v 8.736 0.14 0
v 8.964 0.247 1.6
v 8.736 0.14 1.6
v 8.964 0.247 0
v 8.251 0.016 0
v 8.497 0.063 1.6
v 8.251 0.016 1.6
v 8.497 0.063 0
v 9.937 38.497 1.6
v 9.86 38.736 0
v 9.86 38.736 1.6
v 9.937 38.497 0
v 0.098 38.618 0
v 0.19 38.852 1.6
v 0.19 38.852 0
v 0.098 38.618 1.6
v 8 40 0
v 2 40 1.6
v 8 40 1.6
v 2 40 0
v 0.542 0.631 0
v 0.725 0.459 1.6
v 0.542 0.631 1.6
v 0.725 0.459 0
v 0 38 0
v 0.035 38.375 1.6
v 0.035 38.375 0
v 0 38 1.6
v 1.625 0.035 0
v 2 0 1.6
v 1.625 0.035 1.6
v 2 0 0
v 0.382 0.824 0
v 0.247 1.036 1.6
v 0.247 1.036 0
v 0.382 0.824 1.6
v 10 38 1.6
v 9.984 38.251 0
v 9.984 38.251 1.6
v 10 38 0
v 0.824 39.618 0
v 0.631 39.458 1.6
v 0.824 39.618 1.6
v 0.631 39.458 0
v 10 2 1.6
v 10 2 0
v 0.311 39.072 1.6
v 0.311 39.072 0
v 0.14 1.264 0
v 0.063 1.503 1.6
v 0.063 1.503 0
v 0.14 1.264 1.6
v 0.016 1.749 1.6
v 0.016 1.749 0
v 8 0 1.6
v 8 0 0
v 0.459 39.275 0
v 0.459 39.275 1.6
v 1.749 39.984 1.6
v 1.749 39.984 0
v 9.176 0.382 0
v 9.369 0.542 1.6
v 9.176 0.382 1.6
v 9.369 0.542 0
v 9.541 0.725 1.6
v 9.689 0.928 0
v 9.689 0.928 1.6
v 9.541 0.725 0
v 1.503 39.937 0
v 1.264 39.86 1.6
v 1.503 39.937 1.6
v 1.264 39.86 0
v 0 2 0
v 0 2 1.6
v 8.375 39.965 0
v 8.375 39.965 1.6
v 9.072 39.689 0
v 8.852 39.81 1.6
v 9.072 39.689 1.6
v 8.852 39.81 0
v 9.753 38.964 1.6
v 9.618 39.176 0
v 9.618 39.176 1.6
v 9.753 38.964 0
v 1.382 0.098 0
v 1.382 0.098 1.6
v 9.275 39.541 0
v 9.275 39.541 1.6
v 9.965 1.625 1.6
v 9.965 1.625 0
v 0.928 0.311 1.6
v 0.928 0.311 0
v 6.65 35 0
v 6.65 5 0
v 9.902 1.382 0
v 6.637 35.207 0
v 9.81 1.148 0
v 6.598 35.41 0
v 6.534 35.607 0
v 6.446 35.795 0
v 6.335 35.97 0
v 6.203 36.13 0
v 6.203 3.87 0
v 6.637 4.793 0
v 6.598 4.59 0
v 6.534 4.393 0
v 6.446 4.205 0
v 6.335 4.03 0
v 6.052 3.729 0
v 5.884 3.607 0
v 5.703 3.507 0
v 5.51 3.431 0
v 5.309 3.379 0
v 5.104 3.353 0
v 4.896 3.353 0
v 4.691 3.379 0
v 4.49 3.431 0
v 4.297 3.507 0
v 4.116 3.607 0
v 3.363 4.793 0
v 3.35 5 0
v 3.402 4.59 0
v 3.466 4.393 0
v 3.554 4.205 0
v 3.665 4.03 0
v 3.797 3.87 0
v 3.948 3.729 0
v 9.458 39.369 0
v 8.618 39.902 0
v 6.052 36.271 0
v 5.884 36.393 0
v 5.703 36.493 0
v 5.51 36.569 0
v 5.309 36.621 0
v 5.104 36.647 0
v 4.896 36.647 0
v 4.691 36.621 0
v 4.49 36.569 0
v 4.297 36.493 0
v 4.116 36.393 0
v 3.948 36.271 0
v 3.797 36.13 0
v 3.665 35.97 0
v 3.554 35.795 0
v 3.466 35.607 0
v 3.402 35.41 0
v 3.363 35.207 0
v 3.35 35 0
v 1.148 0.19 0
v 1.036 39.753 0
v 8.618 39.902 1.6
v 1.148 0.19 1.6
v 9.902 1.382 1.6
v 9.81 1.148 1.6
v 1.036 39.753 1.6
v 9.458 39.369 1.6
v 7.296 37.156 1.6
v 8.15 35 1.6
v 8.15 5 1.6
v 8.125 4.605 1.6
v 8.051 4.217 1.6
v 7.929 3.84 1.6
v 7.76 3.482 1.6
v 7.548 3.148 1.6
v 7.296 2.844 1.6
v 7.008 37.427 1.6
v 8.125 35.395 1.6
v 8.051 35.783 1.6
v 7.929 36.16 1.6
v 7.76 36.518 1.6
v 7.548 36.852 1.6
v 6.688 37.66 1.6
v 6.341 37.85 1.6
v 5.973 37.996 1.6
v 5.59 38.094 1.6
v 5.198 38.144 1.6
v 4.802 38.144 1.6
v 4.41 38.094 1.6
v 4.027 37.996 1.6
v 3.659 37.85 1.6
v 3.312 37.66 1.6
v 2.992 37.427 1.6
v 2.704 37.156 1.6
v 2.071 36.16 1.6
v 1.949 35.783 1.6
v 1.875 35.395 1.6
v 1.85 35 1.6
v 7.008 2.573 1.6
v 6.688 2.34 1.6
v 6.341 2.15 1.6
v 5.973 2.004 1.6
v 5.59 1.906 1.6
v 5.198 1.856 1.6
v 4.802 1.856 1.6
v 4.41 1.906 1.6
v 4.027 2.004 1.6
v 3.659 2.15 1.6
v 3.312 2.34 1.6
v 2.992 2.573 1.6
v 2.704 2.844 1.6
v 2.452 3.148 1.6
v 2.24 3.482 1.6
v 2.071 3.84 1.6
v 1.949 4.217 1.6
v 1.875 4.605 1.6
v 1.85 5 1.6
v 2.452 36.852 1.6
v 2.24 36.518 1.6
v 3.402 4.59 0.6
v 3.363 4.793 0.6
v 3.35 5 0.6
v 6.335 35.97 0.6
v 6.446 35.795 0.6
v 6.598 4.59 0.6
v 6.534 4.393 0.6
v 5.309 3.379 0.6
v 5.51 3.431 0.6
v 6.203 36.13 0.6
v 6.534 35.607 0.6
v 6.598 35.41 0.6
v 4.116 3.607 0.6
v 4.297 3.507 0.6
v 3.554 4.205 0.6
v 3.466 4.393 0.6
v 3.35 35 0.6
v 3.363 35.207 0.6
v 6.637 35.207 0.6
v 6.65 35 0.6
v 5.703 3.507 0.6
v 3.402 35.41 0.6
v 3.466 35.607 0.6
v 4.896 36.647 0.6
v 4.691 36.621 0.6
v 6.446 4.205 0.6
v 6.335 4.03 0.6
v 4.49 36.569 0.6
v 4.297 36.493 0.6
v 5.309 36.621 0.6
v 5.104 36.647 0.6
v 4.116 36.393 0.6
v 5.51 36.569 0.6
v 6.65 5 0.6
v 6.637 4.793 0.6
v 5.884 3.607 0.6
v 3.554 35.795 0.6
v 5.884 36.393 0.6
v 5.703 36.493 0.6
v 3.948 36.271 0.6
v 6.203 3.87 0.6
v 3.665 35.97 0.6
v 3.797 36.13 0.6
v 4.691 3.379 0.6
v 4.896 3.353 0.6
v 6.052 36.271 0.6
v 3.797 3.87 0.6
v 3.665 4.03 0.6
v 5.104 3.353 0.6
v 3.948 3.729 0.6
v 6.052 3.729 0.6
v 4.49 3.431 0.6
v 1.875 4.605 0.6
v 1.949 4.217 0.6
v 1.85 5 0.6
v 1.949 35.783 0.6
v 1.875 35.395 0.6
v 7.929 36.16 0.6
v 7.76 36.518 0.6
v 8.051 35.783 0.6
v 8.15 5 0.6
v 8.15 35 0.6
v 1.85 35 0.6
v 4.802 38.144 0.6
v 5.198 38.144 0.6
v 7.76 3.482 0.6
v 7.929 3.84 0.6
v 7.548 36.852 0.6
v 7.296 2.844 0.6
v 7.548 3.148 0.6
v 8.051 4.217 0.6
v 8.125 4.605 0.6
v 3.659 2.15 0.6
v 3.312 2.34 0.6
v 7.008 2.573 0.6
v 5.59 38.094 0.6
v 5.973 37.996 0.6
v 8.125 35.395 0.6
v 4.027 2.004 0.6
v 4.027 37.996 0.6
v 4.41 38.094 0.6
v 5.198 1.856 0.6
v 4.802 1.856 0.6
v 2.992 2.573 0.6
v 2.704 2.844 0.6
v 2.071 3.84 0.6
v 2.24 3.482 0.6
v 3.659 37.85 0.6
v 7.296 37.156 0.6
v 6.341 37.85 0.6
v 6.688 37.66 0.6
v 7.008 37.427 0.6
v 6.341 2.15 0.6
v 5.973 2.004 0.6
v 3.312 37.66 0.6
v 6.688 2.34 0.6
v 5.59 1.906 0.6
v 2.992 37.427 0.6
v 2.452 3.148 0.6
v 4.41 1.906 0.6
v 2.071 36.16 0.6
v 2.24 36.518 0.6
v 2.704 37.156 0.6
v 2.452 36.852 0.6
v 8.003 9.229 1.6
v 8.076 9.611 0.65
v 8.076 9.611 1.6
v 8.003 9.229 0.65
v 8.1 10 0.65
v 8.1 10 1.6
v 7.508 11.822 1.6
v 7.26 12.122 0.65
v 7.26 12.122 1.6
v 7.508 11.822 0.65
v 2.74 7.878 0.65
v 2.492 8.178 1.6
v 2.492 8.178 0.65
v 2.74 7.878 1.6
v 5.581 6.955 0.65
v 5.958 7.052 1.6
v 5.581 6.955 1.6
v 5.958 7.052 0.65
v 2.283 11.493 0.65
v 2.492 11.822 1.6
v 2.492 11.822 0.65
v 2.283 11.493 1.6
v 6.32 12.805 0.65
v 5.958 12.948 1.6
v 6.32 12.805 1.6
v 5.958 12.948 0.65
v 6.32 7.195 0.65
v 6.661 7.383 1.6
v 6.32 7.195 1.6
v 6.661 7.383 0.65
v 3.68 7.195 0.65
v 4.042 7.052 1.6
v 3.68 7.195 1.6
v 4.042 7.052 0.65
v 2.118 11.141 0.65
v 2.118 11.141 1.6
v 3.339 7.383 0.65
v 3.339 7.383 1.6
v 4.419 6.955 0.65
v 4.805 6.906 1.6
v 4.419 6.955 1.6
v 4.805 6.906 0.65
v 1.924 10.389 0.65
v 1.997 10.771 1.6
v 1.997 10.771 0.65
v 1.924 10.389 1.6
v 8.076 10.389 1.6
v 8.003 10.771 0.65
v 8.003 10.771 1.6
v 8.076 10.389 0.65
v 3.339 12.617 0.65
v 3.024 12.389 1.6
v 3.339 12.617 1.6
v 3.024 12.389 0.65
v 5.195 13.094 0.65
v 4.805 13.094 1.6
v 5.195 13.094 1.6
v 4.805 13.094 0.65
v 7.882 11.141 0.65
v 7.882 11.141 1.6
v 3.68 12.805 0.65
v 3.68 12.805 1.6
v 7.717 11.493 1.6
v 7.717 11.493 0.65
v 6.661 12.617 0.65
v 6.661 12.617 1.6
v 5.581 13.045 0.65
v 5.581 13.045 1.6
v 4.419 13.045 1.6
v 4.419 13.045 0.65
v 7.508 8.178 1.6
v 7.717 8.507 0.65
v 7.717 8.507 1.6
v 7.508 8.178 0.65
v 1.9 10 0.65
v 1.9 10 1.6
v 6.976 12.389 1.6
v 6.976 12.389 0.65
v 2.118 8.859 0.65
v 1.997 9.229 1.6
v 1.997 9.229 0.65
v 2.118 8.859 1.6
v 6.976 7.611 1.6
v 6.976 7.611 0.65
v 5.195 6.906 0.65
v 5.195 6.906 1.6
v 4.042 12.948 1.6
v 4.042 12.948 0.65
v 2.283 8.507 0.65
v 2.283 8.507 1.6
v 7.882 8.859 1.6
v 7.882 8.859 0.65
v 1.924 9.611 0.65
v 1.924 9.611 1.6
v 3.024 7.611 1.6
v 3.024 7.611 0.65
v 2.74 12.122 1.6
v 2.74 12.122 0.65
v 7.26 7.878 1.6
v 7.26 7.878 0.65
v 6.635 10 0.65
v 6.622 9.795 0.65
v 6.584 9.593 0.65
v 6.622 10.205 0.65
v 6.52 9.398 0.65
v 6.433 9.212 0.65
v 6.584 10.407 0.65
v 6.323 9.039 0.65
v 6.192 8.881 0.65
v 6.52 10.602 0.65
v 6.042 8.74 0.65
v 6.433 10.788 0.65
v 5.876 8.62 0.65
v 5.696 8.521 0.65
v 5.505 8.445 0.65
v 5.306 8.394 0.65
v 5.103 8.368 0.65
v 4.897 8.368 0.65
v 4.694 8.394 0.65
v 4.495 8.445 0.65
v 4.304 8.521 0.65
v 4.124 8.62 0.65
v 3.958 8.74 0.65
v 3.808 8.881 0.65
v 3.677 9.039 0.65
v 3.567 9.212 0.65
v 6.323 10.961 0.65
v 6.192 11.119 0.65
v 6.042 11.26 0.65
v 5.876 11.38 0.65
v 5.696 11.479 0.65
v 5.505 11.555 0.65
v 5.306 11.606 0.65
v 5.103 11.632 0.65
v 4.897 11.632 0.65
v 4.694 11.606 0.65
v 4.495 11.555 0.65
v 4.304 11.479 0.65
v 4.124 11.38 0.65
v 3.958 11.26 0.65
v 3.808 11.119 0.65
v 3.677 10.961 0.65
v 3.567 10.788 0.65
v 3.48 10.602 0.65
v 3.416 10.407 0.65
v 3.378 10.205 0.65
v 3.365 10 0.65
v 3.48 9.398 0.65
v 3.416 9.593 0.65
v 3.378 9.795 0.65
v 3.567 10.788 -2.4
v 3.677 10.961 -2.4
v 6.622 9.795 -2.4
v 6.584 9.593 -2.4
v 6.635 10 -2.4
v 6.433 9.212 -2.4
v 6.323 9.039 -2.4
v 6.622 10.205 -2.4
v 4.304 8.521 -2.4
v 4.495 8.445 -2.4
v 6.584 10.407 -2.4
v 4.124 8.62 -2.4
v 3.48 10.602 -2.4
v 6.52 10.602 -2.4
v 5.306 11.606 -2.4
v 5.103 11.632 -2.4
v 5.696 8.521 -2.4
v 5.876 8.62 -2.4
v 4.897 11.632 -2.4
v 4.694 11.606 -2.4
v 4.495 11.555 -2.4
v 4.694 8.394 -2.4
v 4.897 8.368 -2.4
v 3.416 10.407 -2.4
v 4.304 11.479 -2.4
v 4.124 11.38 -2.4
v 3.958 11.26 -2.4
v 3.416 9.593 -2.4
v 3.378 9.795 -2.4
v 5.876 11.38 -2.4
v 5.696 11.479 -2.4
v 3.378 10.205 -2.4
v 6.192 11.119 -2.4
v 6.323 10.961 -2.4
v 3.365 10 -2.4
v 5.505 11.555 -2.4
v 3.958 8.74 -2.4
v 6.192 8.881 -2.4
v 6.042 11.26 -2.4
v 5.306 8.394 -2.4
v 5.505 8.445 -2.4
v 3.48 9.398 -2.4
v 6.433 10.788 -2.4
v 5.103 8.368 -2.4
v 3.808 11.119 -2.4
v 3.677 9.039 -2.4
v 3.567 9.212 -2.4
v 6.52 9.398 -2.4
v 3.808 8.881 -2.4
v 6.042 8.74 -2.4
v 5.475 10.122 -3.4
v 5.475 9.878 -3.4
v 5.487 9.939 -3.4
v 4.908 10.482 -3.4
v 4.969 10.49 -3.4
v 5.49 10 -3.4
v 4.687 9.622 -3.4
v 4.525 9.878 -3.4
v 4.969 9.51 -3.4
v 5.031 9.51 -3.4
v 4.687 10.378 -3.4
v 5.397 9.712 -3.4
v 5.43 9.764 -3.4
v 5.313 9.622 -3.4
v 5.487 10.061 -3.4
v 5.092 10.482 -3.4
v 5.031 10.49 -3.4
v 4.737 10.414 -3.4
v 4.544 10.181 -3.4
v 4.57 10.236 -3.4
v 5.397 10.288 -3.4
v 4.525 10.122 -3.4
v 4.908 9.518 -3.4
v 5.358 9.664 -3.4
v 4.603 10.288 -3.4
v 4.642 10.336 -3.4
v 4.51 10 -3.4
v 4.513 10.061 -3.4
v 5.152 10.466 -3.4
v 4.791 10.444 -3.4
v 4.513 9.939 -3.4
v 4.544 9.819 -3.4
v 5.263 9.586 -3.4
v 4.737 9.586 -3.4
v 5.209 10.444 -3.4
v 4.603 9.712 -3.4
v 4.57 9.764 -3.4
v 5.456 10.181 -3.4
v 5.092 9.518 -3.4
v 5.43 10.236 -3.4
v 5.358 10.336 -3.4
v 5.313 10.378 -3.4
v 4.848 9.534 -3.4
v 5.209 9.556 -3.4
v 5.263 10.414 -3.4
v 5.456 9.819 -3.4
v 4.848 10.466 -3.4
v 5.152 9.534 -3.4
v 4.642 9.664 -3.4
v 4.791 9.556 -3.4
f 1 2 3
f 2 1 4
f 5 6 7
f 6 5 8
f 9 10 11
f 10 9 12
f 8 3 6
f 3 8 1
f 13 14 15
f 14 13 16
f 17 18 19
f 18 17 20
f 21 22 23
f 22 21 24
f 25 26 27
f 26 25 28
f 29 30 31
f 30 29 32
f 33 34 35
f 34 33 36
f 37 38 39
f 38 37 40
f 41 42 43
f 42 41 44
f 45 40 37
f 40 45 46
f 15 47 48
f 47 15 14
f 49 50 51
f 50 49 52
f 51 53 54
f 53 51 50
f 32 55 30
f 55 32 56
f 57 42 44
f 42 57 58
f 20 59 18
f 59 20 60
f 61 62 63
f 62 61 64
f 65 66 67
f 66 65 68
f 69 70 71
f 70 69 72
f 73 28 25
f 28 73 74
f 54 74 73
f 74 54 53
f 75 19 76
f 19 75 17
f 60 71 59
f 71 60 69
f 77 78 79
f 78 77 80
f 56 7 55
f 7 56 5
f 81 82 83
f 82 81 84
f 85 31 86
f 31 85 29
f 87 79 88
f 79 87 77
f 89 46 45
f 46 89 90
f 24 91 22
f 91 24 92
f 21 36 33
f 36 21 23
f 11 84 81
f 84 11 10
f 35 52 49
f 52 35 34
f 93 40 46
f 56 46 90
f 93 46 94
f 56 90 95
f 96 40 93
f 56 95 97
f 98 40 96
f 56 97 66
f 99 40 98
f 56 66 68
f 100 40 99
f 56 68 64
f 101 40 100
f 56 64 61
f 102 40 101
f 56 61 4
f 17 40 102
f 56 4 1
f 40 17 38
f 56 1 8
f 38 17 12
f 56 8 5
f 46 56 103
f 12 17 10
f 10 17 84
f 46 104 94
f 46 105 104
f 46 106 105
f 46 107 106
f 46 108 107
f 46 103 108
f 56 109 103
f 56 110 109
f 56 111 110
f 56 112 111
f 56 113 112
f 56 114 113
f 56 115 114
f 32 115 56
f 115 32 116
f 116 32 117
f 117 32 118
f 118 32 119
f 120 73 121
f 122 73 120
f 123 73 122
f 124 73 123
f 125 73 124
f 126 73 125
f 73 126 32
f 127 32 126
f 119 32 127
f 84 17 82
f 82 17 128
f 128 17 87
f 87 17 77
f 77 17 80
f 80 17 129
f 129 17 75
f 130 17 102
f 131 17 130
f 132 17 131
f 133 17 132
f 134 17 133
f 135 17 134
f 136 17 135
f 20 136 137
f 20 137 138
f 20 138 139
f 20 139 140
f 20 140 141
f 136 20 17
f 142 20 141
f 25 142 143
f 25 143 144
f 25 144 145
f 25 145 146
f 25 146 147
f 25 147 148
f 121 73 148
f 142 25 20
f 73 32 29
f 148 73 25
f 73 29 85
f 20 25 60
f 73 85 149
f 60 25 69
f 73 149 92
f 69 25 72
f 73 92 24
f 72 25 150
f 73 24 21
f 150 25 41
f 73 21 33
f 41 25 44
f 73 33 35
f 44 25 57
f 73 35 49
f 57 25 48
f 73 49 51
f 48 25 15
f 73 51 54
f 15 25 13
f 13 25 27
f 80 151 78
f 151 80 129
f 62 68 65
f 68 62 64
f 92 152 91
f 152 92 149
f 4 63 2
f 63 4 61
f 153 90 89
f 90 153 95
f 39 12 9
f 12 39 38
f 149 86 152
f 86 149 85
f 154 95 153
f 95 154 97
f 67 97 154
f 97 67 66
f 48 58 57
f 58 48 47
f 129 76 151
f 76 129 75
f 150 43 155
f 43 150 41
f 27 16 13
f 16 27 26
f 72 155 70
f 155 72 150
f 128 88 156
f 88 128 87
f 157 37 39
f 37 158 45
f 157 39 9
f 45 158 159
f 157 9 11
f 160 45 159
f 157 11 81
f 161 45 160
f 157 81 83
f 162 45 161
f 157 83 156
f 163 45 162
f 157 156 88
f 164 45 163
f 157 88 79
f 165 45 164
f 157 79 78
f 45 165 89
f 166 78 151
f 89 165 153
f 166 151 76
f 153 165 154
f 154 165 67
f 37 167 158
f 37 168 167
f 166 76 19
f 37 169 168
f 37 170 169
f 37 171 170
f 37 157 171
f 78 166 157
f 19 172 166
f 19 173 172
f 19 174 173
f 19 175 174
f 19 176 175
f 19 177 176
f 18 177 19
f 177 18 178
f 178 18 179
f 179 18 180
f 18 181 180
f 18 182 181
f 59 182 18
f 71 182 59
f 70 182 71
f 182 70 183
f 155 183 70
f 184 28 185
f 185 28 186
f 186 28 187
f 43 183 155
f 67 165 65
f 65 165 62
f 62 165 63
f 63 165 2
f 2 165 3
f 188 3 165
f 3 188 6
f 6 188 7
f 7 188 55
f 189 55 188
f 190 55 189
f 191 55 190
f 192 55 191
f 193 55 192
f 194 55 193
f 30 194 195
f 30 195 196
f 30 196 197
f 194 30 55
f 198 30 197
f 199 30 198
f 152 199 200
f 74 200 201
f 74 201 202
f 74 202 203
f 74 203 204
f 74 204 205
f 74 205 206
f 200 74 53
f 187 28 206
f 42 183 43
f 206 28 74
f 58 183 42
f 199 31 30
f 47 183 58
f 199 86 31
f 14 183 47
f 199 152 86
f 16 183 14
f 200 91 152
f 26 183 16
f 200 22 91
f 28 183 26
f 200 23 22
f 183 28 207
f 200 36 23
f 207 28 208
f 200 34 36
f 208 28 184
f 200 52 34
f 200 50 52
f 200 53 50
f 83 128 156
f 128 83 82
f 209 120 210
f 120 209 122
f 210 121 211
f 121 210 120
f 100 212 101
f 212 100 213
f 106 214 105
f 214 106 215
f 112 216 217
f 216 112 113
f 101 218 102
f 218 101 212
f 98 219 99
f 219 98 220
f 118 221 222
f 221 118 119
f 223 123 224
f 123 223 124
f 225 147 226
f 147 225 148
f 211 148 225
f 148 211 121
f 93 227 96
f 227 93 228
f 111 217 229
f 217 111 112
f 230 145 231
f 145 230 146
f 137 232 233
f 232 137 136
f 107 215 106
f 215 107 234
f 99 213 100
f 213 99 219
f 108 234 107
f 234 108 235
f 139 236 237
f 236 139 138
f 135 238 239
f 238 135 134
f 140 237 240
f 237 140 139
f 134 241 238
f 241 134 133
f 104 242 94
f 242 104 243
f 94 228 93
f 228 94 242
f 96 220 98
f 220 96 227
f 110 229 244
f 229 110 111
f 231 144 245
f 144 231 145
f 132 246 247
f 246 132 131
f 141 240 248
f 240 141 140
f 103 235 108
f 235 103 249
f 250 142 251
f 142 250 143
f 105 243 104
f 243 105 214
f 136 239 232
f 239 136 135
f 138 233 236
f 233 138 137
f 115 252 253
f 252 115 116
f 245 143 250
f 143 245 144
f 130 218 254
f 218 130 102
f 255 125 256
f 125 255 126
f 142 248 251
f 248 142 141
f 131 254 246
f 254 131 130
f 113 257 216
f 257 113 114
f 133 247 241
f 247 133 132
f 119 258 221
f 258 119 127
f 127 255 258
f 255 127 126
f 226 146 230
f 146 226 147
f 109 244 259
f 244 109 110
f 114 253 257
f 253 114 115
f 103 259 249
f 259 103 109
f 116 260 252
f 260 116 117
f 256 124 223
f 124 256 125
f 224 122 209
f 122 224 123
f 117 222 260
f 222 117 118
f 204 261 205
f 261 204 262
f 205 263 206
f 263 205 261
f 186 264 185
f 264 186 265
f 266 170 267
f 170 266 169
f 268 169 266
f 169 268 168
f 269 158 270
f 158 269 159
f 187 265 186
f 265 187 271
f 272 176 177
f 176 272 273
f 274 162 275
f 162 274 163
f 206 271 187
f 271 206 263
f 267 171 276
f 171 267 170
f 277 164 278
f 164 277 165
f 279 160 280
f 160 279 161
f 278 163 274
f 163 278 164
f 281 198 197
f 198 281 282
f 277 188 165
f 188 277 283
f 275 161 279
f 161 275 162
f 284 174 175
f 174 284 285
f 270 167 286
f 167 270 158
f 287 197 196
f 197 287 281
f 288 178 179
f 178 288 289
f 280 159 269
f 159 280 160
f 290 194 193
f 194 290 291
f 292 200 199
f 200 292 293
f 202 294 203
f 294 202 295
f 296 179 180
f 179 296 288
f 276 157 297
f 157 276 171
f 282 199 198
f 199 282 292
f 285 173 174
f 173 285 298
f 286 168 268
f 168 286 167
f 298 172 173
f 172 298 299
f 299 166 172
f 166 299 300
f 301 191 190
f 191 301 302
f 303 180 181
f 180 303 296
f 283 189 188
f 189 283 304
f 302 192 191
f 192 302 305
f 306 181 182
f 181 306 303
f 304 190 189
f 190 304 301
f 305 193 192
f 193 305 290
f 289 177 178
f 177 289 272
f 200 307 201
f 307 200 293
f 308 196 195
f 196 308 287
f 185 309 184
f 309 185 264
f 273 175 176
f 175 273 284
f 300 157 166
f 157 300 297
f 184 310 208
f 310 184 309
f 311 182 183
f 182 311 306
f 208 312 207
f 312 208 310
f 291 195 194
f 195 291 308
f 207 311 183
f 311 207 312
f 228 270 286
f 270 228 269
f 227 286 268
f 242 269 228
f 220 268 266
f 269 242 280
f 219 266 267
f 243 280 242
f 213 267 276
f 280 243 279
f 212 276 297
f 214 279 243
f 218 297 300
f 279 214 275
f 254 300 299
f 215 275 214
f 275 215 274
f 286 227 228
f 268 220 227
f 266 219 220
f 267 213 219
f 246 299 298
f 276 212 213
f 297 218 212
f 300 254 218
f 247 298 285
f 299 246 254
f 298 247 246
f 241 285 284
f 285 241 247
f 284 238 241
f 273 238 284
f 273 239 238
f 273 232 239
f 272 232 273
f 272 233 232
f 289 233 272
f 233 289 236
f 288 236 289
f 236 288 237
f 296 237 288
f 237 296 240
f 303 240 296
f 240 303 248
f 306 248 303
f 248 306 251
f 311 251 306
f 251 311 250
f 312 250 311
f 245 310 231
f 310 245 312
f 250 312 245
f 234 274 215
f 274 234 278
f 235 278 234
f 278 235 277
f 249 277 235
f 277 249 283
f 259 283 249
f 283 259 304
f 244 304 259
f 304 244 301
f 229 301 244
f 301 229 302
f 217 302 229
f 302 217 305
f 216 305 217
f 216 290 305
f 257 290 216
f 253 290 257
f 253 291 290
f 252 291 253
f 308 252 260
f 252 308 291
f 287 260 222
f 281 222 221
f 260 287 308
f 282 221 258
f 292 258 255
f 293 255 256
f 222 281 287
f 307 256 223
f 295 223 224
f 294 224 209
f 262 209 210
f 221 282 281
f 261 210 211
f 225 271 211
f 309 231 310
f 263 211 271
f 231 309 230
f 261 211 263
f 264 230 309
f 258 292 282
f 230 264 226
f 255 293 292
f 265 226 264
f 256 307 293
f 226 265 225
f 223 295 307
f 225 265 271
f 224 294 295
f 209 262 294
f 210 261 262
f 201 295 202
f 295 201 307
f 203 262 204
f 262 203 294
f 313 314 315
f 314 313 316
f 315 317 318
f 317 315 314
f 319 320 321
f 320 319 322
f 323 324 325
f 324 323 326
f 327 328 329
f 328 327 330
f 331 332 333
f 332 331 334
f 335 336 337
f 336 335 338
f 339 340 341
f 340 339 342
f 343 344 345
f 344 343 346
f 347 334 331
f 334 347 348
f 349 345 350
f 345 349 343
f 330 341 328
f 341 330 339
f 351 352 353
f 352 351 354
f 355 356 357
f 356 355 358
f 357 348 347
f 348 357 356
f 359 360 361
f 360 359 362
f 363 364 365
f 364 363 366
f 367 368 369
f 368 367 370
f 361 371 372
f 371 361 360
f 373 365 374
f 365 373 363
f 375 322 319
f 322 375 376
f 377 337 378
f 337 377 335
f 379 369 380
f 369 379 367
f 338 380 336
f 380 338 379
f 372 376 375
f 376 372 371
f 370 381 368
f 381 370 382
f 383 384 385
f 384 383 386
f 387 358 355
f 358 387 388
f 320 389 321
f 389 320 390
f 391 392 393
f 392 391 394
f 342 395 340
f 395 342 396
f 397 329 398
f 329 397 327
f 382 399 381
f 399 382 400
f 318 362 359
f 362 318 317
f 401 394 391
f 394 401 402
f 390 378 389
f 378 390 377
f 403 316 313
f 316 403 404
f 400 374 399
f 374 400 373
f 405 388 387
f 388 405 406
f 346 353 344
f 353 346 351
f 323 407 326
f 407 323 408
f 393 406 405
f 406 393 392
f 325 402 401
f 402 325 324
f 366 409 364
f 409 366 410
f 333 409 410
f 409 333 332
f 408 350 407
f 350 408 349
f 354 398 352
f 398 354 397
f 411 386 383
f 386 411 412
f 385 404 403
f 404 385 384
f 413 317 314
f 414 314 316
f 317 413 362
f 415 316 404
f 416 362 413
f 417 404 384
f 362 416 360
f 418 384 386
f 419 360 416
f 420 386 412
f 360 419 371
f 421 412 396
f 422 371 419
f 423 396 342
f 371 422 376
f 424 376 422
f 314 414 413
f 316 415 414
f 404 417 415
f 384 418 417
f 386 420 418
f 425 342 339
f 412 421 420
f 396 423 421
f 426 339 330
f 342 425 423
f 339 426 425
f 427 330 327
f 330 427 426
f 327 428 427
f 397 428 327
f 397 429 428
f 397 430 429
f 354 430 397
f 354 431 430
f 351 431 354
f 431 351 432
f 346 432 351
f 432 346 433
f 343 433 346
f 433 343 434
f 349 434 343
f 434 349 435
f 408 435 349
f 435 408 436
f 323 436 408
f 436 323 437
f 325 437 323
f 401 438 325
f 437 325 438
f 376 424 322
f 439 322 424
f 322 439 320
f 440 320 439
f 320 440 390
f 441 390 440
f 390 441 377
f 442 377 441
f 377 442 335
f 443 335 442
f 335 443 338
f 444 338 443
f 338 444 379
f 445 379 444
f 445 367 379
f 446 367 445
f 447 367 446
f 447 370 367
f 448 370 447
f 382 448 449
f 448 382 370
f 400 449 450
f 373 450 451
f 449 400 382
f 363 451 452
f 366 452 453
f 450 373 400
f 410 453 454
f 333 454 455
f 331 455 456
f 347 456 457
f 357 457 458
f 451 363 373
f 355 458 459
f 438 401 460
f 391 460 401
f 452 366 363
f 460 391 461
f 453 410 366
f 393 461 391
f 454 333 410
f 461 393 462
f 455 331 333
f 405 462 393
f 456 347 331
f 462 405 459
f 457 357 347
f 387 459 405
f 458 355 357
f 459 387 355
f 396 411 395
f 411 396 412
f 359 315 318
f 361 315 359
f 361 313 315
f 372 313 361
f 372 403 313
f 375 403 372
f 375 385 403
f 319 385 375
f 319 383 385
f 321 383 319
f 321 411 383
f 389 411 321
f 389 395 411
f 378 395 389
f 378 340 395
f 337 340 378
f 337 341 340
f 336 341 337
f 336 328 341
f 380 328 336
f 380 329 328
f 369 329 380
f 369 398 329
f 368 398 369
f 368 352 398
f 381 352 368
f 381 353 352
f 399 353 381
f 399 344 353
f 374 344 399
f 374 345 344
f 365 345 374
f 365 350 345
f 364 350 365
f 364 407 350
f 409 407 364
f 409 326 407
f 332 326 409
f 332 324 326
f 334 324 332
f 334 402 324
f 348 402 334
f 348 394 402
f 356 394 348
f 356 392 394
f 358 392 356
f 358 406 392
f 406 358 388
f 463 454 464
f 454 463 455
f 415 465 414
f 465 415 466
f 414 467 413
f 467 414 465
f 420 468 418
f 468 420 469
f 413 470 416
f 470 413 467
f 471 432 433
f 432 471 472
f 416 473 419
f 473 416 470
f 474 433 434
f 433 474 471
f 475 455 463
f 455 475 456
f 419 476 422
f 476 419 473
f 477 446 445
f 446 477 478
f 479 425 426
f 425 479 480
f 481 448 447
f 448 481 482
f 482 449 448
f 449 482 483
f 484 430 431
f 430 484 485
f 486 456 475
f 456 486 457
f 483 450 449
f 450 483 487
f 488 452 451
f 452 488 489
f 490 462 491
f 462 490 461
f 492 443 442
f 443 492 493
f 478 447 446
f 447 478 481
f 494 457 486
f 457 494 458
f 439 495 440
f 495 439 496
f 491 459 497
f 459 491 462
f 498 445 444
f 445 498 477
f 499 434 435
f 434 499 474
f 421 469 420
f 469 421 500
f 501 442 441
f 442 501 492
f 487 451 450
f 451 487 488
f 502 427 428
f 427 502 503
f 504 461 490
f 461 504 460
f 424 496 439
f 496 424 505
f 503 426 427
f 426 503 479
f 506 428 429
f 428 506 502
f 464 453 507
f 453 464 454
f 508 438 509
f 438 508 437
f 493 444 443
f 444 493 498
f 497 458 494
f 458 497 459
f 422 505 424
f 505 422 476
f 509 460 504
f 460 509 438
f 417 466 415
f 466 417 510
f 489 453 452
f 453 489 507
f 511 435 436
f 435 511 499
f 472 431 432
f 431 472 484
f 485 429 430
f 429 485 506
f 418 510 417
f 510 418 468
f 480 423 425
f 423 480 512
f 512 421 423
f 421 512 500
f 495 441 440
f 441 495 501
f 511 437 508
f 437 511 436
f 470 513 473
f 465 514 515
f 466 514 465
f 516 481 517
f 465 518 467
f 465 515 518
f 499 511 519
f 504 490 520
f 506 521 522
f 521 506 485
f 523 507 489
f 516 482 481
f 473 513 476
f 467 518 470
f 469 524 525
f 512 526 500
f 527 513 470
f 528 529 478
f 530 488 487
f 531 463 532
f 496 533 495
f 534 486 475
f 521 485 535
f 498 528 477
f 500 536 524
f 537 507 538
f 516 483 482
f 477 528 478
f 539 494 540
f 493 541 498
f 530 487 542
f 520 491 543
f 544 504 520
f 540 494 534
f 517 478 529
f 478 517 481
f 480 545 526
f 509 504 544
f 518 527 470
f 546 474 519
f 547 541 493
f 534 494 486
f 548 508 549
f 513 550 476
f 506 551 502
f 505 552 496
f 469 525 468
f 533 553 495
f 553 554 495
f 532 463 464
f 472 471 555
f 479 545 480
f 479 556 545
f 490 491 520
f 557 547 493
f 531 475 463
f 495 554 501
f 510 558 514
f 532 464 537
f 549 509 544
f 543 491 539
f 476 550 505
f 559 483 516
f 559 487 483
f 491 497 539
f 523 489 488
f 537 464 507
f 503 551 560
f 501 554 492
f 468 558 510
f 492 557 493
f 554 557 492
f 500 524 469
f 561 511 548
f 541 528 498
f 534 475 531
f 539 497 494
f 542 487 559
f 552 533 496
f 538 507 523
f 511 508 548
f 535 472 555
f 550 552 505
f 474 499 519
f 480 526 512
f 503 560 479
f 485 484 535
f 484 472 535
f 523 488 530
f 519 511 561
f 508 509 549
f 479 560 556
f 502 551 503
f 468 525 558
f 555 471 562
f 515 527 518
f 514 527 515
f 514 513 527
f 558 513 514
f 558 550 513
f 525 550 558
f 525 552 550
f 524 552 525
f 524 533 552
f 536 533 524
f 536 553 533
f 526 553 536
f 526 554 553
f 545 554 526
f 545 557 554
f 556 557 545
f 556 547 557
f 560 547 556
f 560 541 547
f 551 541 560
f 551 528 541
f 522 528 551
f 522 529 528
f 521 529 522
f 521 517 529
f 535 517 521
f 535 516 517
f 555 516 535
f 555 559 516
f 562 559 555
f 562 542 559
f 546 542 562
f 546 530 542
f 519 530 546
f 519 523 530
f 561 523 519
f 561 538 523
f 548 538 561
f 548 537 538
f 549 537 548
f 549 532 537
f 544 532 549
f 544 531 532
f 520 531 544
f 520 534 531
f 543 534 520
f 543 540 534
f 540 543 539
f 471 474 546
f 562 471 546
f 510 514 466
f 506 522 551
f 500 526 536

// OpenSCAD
// file: common.scad
module __fillet(r) {
   offset(r = +r) {
     offset(delta = -r) {
       children();
     }
   }
}

module __chamfer_corners(r) {
    offset(r = +r) {
        offset(delta = -r) {
            children();
        }
    }
}

module __apply_border(size) {
    translate([size, size]) {
        offset(delta = size) {
            children();
        }
    }
}
// file: config.scad
$fn = 50;

pcb_size = [130, 118, 1.6];
stencil_size = [220, 210];

box_size = [80, 80, 20];
lid_size = [240, 240];
fillet_radius = 10;
wall_thickness = 2;
floor_thickness = 1.5;
bolt_diameter = 3;
bolt_head_clearance = 7;
bolt_head_height = 2.7;
nut_diameter = 7;
nut_height = 4;
lid_thickness = 4;
lid_hole_spacing = 10;
lid_hole_diameter = 3.3;
lid_hole_border = 10;
magnet_size = [6.1, 2.1];
lift_hole_diameter = 20;
vacuum_hole_diameter = 12;
guide_hole_diameter = 4;
guide_peg_length = 15;

screw_post_diameter = bolt_head_clearance + 2;
screw_post_inset = 6.3;
// main file
include <config.scad>
include <common.scad>

module adjustable_riser() {
    color("HotPink") {
        difference() {
            linear_extrude(pcb_size.z) {
                __fillet(2) {
                    square([lid_hole_spacing, lid_hole_spacing * 4]);
                }
            }
            translate([lid_hole_spacing / 2, lid_hole_spacing / 2, -0.02]) {
                linear_extrude(pcb_size.z + 0.04) {
                    hull() {
                        circle(d=lid_hole_diameter);
                        translate([0, lid_hole_spacing * 3]) circle(d=lid_hole_diameter);
                    }
                }
            }
            translate([lid_hole_spacing / 2, lid_hole_spacing / 2, pcb_size.z - 1]) {
                linear_extrude(pcb_size) {
                    hull() {
                        circle(d=lid_hole_diameter + 3);
                        translate([0, lid_hole_spacing * 3]) circle(d=lid_hole_diameter + 3);
                    }
                }
            }
        }
    }
}

module adjustable_riser_peg() {
    color("PeachPuff", 0.9) {
        translate([lid_hole_spacing / 2, lid_hole_spacing, pcb_size.z]) {
            rotate([180, 0, 0]) {
                linear_extrude(0.95) {
                    circle(d=lid_hole_diameter + 3 - 0.1);
                }
                linear_extrude(lid_thickness) {
                    circle(d=lid_hole_diameter - 0.03);
                }
                translate([0, 0, lid_thickness]) {
                    linear_extrude(1, scale=0.3) {
                        circle(d=lid_hole_diameter - 0.03);
                    }
                }
            }
        }
    }
}

adjustable_riser();
adjustable_riser_peg();
